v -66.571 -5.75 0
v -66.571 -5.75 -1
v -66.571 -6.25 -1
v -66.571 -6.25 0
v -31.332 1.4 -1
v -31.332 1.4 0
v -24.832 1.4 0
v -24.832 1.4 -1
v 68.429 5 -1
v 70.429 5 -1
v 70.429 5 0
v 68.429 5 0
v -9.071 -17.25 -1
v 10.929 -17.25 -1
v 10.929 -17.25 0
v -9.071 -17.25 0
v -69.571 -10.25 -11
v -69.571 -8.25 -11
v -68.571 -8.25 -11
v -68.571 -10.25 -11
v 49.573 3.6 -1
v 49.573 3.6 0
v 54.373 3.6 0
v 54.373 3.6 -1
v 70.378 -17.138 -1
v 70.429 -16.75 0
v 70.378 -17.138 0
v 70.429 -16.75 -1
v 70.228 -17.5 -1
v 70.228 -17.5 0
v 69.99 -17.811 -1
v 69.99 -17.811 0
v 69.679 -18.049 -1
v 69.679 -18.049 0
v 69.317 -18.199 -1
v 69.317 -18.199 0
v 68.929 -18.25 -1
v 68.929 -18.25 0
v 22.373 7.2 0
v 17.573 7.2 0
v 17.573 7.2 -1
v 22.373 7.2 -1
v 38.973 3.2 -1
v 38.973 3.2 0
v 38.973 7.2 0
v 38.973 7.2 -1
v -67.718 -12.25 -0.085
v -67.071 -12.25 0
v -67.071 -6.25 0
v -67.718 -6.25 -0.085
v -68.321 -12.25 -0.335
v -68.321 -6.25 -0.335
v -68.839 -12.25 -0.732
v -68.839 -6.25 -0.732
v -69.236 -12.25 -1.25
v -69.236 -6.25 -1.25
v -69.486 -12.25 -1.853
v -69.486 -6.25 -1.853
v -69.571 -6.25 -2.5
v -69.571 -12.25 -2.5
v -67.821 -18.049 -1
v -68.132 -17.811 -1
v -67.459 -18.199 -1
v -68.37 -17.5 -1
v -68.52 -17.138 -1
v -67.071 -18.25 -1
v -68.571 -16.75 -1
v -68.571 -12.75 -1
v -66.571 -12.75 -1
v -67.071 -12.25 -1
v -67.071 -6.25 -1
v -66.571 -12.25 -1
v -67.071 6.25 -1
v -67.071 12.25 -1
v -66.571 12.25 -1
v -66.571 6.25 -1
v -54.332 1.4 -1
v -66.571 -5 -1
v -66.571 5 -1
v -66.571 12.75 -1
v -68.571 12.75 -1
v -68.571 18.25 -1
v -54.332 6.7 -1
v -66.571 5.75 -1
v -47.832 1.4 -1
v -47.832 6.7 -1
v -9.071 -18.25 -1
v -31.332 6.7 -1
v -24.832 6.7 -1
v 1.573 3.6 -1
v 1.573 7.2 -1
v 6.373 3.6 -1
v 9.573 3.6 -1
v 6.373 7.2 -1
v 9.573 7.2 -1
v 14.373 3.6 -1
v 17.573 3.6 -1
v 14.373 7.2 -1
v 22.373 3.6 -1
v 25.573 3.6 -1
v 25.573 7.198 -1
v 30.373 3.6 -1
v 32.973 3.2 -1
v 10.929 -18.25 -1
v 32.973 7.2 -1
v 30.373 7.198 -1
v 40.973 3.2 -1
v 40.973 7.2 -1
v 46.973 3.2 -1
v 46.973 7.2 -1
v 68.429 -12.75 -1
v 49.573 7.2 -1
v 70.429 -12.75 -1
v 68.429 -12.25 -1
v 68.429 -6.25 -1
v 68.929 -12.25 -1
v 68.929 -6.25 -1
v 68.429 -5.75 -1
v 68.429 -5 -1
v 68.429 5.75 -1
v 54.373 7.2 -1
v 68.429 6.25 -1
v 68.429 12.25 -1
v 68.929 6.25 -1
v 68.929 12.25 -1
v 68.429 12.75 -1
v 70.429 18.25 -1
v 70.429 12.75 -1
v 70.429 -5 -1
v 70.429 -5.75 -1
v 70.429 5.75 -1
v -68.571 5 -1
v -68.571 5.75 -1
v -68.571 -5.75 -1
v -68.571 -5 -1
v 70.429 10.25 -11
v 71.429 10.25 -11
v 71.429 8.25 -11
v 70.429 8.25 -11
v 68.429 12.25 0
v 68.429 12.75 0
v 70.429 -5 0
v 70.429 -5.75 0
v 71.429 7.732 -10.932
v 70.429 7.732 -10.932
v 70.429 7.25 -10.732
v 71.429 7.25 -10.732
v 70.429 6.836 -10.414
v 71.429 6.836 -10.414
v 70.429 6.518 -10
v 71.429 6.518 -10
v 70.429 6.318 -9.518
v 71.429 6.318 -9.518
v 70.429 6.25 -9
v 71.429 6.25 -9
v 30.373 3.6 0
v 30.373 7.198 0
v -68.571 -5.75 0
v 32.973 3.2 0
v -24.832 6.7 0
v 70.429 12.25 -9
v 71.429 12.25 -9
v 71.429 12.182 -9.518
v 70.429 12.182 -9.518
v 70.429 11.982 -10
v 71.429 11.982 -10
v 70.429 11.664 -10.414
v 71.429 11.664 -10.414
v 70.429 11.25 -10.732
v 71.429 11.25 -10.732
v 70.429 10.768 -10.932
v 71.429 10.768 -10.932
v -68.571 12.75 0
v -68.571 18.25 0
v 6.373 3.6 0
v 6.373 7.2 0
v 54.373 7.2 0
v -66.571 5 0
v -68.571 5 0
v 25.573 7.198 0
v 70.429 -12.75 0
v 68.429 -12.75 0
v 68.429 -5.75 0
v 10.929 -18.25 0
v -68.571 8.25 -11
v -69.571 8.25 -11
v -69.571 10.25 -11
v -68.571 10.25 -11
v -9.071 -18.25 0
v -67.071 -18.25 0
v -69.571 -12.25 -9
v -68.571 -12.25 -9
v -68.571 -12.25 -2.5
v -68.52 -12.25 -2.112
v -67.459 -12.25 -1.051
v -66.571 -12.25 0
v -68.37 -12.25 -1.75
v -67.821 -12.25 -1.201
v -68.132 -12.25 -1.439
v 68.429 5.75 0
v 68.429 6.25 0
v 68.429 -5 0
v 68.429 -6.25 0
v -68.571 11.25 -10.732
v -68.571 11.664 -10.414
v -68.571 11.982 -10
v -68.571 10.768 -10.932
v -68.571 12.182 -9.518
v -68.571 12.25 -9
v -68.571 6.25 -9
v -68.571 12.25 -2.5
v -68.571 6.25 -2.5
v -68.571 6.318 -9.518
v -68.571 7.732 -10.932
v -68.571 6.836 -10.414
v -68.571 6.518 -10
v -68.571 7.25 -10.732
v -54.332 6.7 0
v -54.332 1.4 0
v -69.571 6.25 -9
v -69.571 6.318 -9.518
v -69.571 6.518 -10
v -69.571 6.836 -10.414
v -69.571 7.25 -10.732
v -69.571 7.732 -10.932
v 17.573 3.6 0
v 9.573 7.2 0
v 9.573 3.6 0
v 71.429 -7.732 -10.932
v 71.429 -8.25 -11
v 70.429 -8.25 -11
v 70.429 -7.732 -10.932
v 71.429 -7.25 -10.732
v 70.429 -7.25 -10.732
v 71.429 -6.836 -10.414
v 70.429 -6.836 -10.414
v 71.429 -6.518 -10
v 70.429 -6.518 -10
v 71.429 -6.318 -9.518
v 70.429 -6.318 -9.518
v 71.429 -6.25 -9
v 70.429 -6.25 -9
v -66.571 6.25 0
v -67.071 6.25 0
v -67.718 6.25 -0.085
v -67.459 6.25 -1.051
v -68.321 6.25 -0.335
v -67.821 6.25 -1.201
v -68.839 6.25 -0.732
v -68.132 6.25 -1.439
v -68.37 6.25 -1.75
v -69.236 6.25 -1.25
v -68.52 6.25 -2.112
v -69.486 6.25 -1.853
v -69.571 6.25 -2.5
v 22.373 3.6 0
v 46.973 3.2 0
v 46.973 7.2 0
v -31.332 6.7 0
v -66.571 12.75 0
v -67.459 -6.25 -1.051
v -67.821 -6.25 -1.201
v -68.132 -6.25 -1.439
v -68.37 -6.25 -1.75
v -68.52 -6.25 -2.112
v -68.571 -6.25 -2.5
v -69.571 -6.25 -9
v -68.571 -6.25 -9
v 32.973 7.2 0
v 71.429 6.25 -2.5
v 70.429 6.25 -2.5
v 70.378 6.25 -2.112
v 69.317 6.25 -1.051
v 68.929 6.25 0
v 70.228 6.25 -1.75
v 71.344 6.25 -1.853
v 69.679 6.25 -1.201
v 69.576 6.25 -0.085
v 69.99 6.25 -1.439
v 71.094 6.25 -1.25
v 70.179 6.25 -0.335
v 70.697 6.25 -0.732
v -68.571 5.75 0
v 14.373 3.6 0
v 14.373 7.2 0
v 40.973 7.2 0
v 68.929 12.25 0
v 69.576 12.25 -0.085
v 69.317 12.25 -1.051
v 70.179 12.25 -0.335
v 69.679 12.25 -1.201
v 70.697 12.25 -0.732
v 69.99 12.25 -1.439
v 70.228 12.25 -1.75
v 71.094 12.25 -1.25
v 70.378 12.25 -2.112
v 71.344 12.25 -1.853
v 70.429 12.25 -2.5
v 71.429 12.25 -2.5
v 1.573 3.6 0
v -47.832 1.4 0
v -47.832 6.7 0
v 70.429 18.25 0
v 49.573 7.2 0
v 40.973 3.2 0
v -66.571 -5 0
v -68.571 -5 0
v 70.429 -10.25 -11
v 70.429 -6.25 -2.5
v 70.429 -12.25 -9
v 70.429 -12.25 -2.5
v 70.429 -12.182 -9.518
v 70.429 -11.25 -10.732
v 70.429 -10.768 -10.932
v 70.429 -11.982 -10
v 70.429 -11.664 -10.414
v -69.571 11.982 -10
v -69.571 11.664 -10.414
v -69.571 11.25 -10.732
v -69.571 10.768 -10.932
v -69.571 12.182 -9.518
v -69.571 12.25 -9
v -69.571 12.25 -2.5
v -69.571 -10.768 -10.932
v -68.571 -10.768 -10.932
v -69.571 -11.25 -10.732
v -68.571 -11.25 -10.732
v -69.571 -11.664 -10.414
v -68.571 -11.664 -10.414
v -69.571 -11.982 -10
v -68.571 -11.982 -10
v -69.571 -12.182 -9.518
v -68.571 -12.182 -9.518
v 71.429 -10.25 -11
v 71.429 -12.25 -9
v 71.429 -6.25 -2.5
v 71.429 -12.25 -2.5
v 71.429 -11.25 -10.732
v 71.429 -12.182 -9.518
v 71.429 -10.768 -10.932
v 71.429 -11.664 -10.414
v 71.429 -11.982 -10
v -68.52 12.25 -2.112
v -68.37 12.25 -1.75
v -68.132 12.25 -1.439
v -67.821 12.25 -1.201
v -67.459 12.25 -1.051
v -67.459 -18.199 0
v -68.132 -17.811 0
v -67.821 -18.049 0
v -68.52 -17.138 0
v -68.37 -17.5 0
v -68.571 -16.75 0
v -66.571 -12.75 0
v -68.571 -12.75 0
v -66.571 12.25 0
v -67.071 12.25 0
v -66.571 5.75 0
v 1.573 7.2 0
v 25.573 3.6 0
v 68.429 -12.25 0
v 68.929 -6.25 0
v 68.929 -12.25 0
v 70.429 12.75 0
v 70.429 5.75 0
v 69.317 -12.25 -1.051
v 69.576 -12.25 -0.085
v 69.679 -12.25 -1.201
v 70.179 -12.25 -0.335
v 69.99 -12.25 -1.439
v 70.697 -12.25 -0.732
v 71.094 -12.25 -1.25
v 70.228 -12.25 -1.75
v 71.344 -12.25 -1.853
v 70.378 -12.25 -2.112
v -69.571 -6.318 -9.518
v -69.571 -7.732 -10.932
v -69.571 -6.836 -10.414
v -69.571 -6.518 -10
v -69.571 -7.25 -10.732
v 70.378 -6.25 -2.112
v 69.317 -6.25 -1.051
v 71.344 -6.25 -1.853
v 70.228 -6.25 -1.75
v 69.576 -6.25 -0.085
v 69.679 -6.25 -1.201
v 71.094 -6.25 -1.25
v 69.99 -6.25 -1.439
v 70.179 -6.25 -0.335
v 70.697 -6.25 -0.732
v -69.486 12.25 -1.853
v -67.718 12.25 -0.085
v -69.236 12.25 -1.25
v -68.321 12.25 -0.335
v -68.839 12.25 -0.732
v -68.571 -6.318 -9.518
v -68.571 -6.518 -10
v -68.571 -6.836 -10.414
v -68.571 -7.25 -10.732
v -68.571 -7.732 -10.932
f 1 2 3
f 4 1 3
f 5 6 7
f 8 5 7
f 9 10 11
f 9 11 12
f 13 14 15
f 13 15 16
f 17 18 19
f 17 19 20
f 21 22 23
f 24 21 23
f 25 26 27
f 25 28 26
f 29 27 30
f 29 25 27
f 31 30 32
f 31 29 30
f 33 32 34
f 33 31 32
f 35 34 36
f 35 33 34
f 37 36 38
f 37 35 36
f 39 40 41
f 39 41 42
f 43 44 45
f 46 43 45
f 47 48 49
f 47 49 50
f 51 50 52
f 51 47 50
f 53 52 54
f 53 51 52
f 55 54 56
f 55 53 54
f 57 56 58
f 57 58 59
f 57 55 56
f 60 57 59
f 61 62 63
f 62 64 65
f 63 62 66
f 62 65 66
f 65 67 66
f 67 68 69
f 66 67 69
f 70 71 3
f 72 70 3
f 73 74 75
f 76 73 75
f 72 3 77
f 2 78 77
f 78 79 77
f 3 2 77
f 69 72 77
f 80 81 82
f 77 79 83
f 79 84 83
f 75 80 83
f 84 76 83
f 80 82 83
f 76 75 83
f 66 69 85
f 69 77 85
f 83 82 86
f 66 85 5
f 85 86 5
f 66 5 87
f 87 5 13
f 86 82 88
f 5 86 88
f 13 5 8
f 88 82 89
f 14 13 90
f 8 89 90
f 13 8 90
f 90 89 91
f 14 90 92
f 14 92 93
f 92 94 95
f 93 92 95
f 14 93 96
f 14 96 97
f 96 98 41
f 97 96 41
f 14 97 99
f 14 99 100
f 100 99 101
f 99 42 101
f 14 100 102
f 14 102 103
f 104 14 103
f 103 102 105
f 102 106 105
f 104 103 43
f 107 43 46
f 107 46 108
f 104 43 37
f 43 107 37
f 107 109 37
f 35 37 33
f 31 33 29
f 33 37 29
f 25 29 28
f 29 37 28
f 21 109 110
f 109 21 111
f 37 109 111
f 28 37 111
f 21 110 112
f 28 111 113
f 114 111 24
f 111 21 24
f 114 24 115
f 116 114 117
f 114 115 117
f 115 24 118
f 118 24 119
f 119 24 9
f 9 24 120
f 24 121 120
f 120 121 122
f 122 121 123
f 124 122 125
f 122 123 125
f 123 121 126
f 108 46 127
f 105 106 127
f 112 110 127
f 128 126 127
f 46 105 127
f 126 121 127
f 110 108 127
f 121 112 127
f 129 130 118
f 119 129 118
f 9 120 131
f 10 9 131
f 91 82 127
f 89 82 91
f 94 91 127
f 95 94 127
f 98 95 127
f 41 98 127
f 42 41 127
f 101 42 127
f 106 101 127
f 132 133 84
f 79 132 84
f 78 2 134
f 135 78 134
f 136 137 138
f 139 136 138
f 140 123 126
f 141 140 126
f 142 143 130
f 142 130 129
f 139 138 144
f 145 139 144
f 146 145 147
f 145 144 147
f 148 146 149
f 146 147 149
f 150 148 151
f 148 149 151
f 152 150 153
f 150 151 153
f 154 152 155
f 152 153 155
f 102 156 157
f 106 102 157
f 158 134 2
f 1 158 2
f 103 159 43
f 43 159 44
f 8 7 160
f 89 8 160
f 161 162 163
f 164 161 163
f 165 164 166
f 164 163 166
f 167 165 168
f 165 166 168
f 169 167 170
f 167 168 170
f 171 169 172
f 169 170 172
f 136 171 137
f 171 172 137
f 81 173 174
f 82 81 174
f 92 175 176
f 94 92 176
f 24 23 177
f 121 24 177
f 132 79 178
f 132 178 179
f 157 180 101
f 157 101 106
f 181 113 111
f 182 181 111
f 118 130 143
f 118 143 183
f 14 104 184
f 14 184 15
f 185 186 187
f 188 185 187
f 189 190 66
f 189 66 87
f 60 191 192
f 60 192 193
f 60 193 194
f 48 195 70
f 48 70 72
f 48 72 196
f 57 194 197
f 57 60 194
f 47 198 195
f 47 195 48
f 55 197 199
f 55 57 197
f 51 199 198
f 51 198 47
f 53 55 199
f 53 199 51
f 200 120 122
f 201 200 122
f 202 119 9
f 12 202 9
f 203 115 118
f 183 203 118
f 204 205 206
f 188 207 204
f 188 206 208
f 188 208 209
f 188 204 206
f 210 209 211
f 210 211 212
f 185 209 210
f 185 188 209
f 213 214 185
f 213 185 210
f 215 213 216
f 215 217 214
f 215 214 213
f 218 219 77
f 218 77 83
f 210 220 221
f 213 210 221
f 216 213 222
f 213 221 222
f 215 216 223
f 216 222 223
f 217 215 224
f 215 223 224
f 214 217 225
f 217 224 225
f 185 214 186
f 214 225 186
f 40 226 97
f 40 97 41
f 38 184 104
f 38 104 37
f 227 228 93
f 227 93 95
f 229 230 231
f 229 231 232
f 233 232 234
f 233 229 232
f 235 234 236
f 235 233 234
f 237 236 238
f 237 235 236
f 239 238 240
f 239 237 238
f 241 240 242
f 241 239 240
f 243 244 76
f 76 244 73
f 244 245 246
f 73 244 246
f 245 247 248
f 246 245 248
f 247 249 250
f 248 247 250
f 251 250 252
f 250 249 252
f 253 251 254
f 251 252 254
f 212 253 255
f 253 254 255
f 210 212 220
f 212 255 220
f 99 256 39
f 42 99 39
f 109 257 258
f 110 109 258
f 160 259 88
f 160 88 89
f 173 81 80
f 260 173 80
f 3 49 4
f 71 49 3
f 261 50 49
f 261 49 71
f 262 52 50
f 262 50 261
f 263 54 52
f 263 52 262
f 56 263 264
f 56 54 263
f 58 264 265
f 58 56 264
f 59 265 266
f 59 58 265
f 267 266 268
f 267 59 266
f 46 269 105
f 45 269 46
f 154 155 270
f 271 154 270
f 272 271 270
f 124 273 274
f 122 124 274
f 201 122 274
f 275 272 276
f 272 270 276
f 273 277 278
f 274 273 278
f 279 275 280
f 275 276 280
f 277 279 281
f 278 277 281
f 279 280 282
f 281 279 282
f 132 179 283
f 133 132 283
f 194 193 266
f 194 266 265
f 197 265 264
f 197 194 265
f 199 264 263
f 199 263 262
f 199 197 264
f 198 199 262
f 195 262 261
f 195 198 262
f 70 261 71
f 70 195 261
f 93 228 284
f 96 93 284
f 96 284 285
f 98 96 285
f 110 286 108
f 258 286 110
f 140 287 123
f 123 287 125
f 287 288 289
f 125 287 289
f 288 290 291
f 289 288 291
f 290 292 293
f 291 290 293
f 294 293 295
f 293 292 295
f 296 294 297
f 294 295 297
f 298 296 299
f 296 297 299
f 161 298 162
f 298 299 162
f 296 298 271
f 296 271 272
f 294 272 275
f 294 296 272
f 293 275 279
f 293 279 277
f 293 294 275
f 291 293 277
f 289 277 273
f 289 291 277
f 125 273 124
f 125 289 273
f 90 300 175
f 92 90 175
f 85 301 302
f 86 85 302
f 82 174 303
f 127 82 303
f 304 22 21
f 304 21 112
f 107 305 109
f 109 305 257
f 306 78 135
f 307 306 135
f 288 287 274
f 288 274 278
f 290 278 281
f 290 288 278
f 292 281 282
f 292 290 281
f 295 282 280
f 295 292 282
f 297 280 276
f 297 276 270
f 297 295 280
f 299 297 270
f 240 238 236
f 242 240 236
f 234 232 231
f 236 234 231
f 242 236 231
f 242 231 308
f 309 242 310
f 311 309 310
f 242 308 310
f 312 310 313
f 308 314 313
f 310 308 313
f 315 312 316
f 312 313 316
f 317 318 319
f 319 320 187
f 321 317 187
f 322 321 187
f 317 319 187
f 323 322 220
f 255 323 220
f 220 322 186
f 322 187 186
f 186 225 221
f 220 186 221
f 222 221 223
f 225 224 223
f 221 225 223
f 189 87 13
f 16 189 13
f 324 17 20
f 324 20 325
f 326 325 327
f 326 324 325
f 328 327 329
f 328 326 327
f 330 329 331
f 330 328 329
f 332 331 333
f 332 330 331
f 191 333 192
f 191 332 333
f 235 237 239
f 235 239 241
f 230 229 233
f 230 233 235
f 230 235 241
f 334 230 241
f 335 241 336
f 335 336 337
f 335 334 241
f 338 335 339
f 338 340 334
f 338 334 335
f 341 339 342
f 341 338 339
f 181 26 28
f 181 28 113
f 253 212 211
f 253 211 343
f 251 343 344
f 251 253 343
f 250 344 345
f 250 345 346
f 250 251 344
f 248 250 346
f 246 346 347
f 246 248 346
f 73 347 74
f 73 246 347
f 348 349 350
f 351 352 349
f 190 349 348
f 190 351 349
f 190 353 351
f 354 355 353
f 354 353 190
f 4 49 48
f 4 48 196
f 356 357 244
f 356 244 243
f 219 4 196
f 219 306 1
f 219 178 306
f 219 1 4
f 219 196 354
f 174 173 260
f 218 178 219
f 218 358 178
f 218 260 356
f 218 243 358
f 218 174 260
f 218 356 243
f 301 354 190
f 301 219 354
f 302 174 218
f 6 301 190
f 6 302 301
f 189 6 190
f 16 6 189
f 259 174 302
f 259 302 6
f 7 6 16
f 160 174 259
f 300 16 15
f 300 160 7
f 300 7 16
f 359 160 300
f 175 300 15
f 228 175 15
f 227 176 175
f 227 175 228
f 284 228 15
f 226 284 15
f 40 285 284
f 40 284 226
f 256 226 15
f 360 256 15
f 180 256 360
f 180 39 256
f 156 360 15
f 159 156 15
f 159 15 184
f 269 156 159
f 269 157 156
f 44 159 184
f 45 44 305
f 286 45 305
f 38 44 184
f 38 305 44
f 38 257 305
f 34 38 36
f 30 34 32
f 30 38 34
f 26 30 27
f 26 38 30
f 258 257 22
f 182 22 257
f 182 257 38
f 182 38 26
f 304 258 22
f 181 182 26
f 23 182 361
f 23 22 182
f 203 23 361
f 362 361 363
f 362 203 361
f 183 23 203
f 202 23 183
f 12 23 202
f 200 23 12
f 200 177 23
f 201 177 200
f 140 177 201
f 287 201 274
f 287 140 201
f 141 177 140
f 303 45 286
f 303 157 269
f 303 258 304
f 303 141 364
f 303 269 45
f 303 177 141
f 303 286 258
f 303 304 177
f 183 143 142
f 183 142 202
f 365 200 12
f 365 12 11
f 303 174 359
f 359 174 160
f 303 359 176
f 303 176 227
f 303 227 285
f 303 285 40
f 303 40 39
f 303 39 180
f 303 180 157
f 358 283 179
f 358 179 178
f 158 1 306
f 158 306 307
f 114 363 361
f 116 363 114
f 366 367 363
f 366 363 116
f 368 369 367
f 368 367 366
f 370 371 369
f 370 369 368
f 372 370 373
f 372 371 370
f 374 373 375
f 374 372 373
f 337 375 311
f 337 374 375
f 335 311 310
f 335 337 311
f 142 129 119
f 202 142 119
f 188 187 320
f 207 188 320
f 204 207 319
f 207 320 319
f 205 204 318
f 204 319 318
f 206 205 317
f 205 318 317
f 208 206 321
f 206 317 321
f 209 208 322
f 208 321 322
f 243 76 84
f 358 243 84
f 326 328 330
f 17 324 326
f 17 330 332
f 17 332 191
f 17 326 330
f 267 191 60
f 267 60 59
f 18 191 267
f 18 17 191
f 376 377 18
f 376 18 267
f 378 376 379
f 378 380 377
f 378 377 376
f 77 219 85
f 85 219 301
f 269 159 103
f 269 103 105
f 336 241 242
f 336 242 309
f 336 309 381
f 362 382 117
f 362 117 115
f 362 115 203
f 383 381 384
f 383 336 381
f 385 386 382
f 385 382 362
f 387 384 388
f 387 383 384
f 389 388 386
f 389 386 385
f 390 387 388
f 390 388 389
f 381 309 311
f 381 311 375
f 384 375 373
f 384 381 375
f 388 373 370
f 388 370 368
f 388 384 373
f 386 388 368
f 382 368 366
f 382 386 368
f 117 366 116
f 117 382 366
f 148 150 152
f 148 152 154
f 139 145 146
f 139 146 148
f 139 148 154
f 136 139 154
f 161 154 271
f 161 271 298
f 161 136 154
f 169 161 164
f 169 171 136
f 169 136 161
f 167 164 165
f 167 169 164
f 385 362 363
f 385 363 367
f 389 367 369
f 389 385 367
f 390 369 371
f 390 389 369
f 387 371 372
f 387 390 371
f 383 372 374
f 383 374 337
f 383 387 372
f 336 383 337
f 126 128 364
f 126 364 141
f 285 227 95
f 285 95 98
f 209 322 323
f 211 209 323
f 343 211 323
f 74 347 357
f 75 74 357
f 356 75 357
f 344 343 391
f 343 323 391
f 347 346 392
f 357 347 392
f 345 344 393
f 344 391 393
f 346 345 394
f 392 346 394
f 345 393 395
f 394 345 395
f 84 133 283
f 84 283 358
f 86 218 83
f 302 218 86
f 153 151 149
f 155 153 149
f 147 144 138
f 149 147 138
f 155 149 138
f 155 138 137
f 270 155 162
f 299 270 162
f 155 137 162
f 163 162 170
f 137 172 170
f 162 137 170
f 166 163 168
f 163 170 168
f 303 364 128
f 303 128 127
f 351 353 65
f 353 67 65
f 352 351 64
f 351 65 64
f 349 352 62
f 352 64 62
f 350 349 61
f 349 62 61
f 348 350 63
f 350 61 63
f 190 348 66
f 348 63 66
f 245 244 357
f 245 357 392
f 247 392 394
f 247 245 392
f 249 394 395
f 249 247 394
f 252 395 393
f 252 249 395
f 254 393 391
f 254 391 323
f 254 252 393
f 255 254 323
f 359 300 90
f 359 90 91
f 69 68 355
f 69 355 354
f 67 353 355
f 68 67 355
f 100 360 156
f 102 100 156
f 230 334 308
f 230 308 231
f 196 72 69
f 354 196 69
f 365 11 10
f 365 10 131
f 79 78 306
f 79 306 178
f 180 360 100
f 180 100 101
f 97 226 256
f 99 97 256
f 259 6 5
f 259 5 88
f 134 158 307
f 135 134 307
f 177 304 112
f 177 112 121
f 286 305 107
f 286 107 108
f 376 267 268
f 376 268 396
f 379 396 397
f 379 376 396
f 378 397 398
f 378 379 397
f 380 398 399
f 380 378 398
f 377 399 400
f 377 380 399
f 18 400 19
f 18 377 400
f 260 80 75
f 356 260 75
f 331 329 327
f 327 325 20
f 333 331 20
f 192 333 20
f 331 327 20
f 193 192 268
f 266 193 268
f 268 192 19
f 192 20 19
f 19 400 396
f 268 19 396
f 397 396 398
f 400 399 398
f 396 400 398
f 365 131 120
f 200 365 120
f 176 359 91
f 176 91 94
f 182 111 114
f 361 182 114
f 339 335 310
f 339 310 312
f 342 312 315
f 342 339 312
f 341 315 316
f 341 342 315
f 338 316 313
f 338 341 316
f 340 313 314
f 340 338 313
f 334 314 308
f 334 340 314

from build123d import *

# Parameters (mm, degrees)
SKETCH1_W                       = 139
SKETCH1_H                       = 36.5
BASE_FLANGE1_DEPTH              = 1
EDGE_FLANGE1_STRIP_W            = 7
EDGE_FLANGE1_STRIP_H            = 1
EDGE_FLANGE1_STRIP_CUT_DEPTH    = 6
EDGE_FLANGE1_RELIEF_W           = 7.5
EDGE_FLANGE1_RELIEF_H           = 0.5
EDGE_FLANGE1_RELIEF_CUT_DEPTH   = 1
EDGE_FLANGE1_STRIP_2_W          = 7
EDGE_FLANGE1_STRIP_2_H          = 1
EDGE_FLANGE1_STRIP_CUT_2_DEPTH  = 6
EDGE_FLANGE1_RELIEF_2_W         = 7.5
EDGE_FLANGE1_RELIEF_2_H         = 0.5
EDGE_FLANGE1_RELIEF_CUT_2_DEPTH = 1
EDGE_FLANGE1_DEPTH              = 6
EDGE_FLANGE1_START              = -1
EDGE_FLANGE1_FLAT_DEPTH         = 1
EDGE_FLANGE1_BEND_DEPTH         = 6
EDGE_FLANGE1_FLAT_2_DEPTH       = 1
EDGE_FLANGE2_STRIP_W            = 7
EDGE_FLANGE2_STRIP_H            = 1
EDGE_FLANGE2_STRIP_CUT_DEPTH    = 6
EDGE_FLANGE2_RELIEF_W           = 7.5
EDGE_FLANGE2_RELIEF_H           = 0.5
EDGE_FLANGE2_RELIEF_CUT_DEPTH   = 1
EDGE_FLANGE2_STRIP_2_W          = 7
EDGE_FLANGE2_STRIP_2_H          = 1
EDGE_FLANGE2_STRIP_CUT_2_DEPTH  = 6
EDGE_FLANGE2_RELIEF_2_W         = 7.5
EDGE_FLANGE2_RELIEF_2_H         = 0.5
EDGE_FLANGE2_RELIEF_CUT_2_DEPTH = 1
EDGE_FLANGE2_DEPTH              = 6
EDGE_FLANGE2_START              = 1
EDGE_FLANGE2_FLAT_DEPTH         = 1
EDGE_FLANGE2_BEND_DEPTH         = 6
EDGE_FLANGE2_FLAT_2_DEPTH       = 1
SKETCH20_W                      = 20
SKETCH20_H                      = 1
SKETCH20_W_2                    = 2
SKETCH20_H_2                    = 10
CUT_EXTRUDE1_DEPTH              = 10
FILLET1_R                       = 1.5
SKETCH28_W                      = 4.80000148
SKETCH28_H                      = 3.5999988
SKETCH28_H_2                    = 3.597941299
SKETCH28_W_2                    = 5.99999908
SKETCH28_H_3                    = 4.00000054
SKETCH28_W_3                    = 6.50000116
SKETCH28_H_4                    = 5.30000102
CUT_EXTRUDE3_DEPTH              = 10


# Sheet-metal steps are written as plain solids
with BuildPart() as part:
    # Sketch1 → Base-Flange1 (new body)
    with BuildSketch(Plane.XY):
        with Locations((0.929014267, 0)):
            Rectangle(SKETCH1_W, SKETCH1_H)
    extrude(amount=-BASE_FLANGE1_DEPTH)

    # Edge-Flange1 strip (across the edge) → Edge-Flange1 strip cut (cut)
    with BuildSketch(Plane(origin=(-68.570985733, 6.25, -1), x_dir=(1, 0, 0), z_dir=(0, 1, 0))):
        with Locations((-2, -0.5)):
            Rectangle(EDGE_FLANGE1_STRIP_W, EDGE_FLANGE1_STRIP_H)
    extrude(amount=EDGE_FLANGE1_STRIP_CUT_DEPTH, mode=Mode.SUBTRACT)

    # Edge-Flange1 relief (on the sheet) → Edge-Flange1 relief cut (cut)
    with BuildSketch(Plane(origin=(-67.070985733, 6.25, -1), x_dir=(1, 0, 0), z_dir=(0, 0, -1))):
        with Locations((-3.25, 0.25)):
            Rectangle(EDGE_FLANGE1_RELIEF_W, EDGE_FLANGE1_RELIEF_H)
        with Locations((-3.25, -6.25)):
            Rectangle(EDGE_FLANGE1_RELIEF_W, EDGE_FLANGE1_RELIEF_H)
    extrude(amount=-EDGE_FLANGE1_RELIEF_CUT_DEPTH, mode=Mode.SUBTRACT)

    # Edge-Flange1 strip 2 (across the edge) → Edge-Flange1 strip cut 2 (cut)
    with BuildSketch(Plane(origin=(70.429014267, 12.25, -1), x_dir=(-1, 0, 0), z_dir=(0, -1, 0))):
        with Locations((-2, -0.5)):
            Rectangle(EDGE_FLANGE1_STRIP_2_W, EDGE_FLANGE1_STRIP_2_H)
    extrude(amount=EDGE_FLANGE1_STRIP_CUT_2_DEPTH, mode=Mode.SUBTRACT)

    # Edge-Flange1 relief 2 (on the sheet) → Edge-Flange1 relief cut 2 (cut)
    with BuildSketch(Plane(origin=(68.929014267, 12.25, -1), x_dir=(-1, 0, 0), z_dir=(0, 0, -1))):
        with Locations((-3.25, 0.25)):
            Rectangle(EDGE_FLANGE1_RELIEF_2_W, EDGE_FLANGE1_RELIEF_2_H)
        with Locations((-3.25, -6.25)):
            Rectangle(EDGE_FLANGE1_RELIEF_2_W, EDGE_FLANGE1_RELIEF_2_H)
    extrude(amount=-EDGE_FLANGE1_RELIEF_CUT_2_DEPTH, mode=Mode.SUBTRACT)

    # Edge-Flange1 bend section (across the edge) → Edge-Flange1 (add)
    with BuildSketch(Plane(origin=(-68.570985733, 6.25, -1), x_dir=(1, 0, 0), z_dir=(0, 1, 0))):
        with BuildLine():
            Line((-1, 1.5), (0, 1.5))
            ThreePointArc((0, 1.5), (0.439339828, 0.439339828), (1.5, 0))
            Line((1.5, 0), (1.5, -1))
            ThreePointArc((1.5, -1), (-0.267766953, -0.267766953), (-1, 1.5))
        make_face()
    extrude(amount=EDGE_FLANGE1_DEPTH)

    # Edge-Flange1 profile (on flange) → Edge-Flange1 flat (add)
    with BuildSketch(Plane(origin=(-68.570985733, 0, -1), x_dir=(0, -1, 0), z_dir=(1, 0, 0)).offset(EDGE_FLANGE1_START)):
        with BuildLine():
            ThreePointArc((-6.25, 8), (-6.835786438, 9.414213562), (-8.25, 10))
            Line((-8.25, 10), (-10.25, 10))
            ThreePointArc((-10.25, 10), (-11.664213562, 9.414213562), (-12.25, 8))
            Line((-12.25, 8), (-12.25, 1.5))
            Line((-12.25, 1.5), (-6.25, 1.5))
            Line((-6.25, 1.5), (-6.25, 8))
        make_face()
    extrude(amount=EDGE_FLANGE1_FLAT_DEPTH)

    # Edge-Flange1 bend section 2 (across the edge) → Edge-Flange1 bend (add)
    with BuildSketch(Plane(origin=(70.429014267, 12.25, -1), x_dir=(-1, 0, 0), z_dir=(0, -1, 0))):
        with BuildLine():
            Line((-1, 1.5), (0, 1.5))
            ThreePointArc((0, 1.5), (0.439339828, 0.439339828), (1.5, 0))
            Line((1.5, 0), (1.5, -1))
            ThreePointArc((1.5, -1), (-0.267766953, -0.267766953), (-1, 1.5))
        make_face()
    extrude(amount=EDGE_FLANGE1_BEND_DEPTH)

    # Edge-Flange1 profile 2 (on flange) → Edge-Flange1 flat 2 (add)
    with BuildSketch(Plane(origin=(70.429014267, 0, -1), x_dir=(0, 1, 0), z_dir=(-1, 0, 0)).offset(EDGE_FLANGE1_START)):
        with BuildLine():
            Line((12.25, 1.5), (12.25, 8))
            ThreePointArc((12.25, 8), (11.664213562, 9.414213562), (10.25, 10))
            Line((10.25, 10), (8.25, 10))
            ThreePointArc((8.25, 10), (6.835786438, 9.414213562), (6.25, 8))
            Line((6.25, 8), (6.25, 1.5))
            Line((6.25, 1.5), (12.25, 1.5))
        make_face()
    extrude(amount=EDGE_FLANGE1_FLAT_2_DEPTH)

    # Edge-Flange2 strip (across the edge) → Edge-Flange2 strip cut (cut)
    with BuildSketch(Plane(origin=(70.429014267, -6.25, -1), x_dir=(-1, 0, 0), z_dir=(0, -1, 0))):
        with Locations((-2, -0.5)):
            Rectangle(EDGE_FLANGE2_STRIP_W, EDGE_FLANGE2_STRIP_H)
    extrude(amount=EDGE_FLANGE2_STRIP_CUT_DEPTH, mode=Mode.SUBTRACT)

    # Edge-Flange2 relief (on the sheet) → Edge-Flange2 relief cut (cut)
    with BuildSketch(Plane(origin=(68.929014267, -6.25, -1), x_dir=(-1, 0, 0), z_dir=(0, 0, -1))):
        with Locations((-3.25, 0.25)):
            Rectangle(EDGE_FLANGE2_RELIEF_W, EDGE_FLANGE2_RELIEF_H)
        with Locations((-3.25, -6.25)):
            Rectangle(EDGE_FLANGE2_RELIEF_W, EDGE_FLANGE2_RELIEF_H)
    extrude(amount=-EDGE_FLANGE2_RELIEF_CUT_DEPTH, mode=Mode.SUBTRACT)

    # Edge-Flange2 strip 2 (across the edge) → Edge-Flange2 strip cut 2 (cut)
    with BuildSketch(Plane(origin=(-68.570985733, -12.25, -1), x_dir=(1, 0, 0), z_dir=(0, 1, 0))):
        with Locations((-2, -0.5)):
            Rectangle(EDGE_FLANGE2_STRIP_2_W, EDGE_FLANGE2_STRIP_2_H)
    extrude(amount=EDGE_FLANGE2_STRIP_CUT_2_DEPTH, mode=Mode.SUBTRACT)

    # Edge-Flange2 relief 2 (on the sheet) → Edge-Flange2 relief cut 2 (cut)
    with BuildSketch(Plane(origin=(-67.070985733, -12.25, -1), x_dir=(1, 0, 0), z_dir=(0, 0, -1))):
        with Locations((-3.25, 0.25)):
            Rectangle(EDGE_FLANGE2_RELIEF_2_W, EDGE_FLANGE2_RELIEF_2_H)
        with Locations((-3.25, -6.25)):
            Rectangle(EDGE_FLANGE2_RELIEF_2_W, EDGE_FLANGE2_RELIEF_2_H)
    extrude(amount=-EDGE_FLANGE2_RELIEF_CUT_2_DEPTH, mode=Mode.SUBTRACT)

    # Edge-Flange2 bend section (across the edge) → Edge-Flange2 (add)
    with BuildSketch(Plane(origin=(70.429014267, -6.25, -1), x_dir=(-1, 0, 0), z_dir=(0, -1, 0))):
        with BuildLine():
            Line((-1, 1.5), (0, 1.5))
            ThreePointArc((0, 1.5), (0.439339828, 0.439339828), (1.5, 0))
            Line((1.5, 0), (1.5, -1))
            ThreePointArc((1.5, -1), (-0.267766953, -0.267766953), (-1, 1.5))
        make_face()
    extrude(amount=EDGE_FLANGE2_DEPTH)

    # Edge-Flange2 profile (on flange) → Edge-Flange2 flat (add)
    with BuildSketch(Plane(origin=(70.429014267, 0, -1), x_dir=(0, -1, 0), z_dir=(1, 0, 0)).offset(EDGE_FLANGE2_START)):
        with BuildLine():
            Line((12.25, 1.5), (12.25, 8))
            ThreePointArc((12.25, 8), (11.664213562, 9.414213562), (10.25, 10))
            Line((10.25, 10), (8.25, 10))
            ThreePointArc((8.25, 10), (6.835786438, 9.414213562), (6.25, 8))
            Line((6.25, 8), (6.25, 1.5))
            Line((6.25, 1.5), (12.25, 1.5))
        make_face()
    extrude(amount=-EDGE_FLANGE2_FLAT_DEPTH)

    # Edge-Flange2 bend section 2 (across the edge) → Edge-Flange2 bend (add)
    with BuildSketch(Plane(origin=(-68.570985733, -12.25, -1), x_dir=(1, 0, 0), z_dir=(0, 1, 0))):
        with BuildLine():
            Line((-1, 1.5), (0, 1.5))
            ThreePointArc((0, 1.5), (0.439339828, 0.439339828), (1.5, 0))
            Line((1.5, 0), (1.5, -1))
            ThreePointArc((1.5, -1), (-0.267766953, -0.267766953), (-1, 1.5))
        make_face()
    extrude(amount=EDGE_FLANGE2_BEND_DEPTH)

    # Edge-Flange2 profile 2 (on flange) → Edge-Flange2 flat 2 (add)
    with BuildSketch(Plane(origin=(-68.570985733, 0, -1), x_dir=(0, 1, 0), z_dir=(-1, 0, 0)).offset(EDGE_FLANGE2_START)):
        with BuildLine():
            ThreePointArc((-6.25, 8), (-6.835786438, 9.414213562), (-8.25, 10))
            Line((-8.25, 10), (-10.25, 10))
            ThreePointArc((-10.25, 10), (-11.664213562, 9.414213562), (-12.25, 8))
            Line((-12.25, 8), (-12.25, 1.5))
            Line((-12.25, 1.5), (-6.25, 1.5))
            Line((-6.25, 1.5), (-6.25, 8))
        make_face()
    extrude(amount=-EDGE_FLANGE2_FLAT_2_DEPTH)

    # Sketch20 → Cut-Extrude1 (cut)
    with BuildSketch(Plane(origin=(0, 0, -1), x_dir=(-1, 0, 0), z_dir=(0, 0, -1))):
        with Locations((-0.929014267, -17.75)):
            Rectangle(SKETCH20_W, SKETCH20_H)
        with Locations((-69.429014267, 0)):
            Rectangle(SKETCH20_W_2, SKETCH20_H_2)
        with Locations((67.570985733, 0)):
            Rectangle(SKETCH20_W_2, SKETCH20_H_2)
    extrude(amount=-CUT_EXTRUDE1_DEPTH, mode=Mode.SUBTRACT)

    # Fillet1
    fillet1_edges = [part.edges().sort_by_distance(p)[0] for p in [
        (70.429014267, -18.25, -0.5),
        (-68.570985733, -18.25, -0.5),
    ]]
    fillet(fillet1_edges, radius=FILLET1_R)

    # Sketch28 → Cut-Extrude3 (cut)
    with BuildSketch(Plane.XY):
        with Locations((3.972975907, 5.4002406)):
            Rectangle(SKETCH28_W, SKETCH28_H)
        with Locations((11.972975147, 5.4002406)):
            Rectangle(SKETCH28_W, SKETCH28_H)
        with Locations((19.972974387, 5.4002406)):
            Rectangle(SKETCH28_W, SKETCH28_H)
        with Locations((27.972973627, 5.39921185)):
            Rectangle(SKETCH28_W, SKETCH28_H_2)
        with Locations((35.972972867, 5.20023973)):
            Rectangle(SKETCH28_W_2, SKETCH28_H_3)
        with Locations((43.972972107, 5.20023973)):
            Rectangle(SKETCH28_W_2, SKETCH28_H_3)
        with Locations((51.972971347, 5.4002406)):
            Rectangle(SKETCH28_W, SKETCH28_H)
        with Locations((-51.082027013, 4.05023949)):
            Rectangle(SKETCH28_W_3, SKETCH28_H_4)
        with Locations((-28.082027293, 4.05023949)):
            Rectangle(SKETCH28_W_3, SKETCH28_H_4)
    extrude(amount=-CUT_EXTRUDE3_DEPTH, mode=Mode.SUBTRACT)


solid = part.part
